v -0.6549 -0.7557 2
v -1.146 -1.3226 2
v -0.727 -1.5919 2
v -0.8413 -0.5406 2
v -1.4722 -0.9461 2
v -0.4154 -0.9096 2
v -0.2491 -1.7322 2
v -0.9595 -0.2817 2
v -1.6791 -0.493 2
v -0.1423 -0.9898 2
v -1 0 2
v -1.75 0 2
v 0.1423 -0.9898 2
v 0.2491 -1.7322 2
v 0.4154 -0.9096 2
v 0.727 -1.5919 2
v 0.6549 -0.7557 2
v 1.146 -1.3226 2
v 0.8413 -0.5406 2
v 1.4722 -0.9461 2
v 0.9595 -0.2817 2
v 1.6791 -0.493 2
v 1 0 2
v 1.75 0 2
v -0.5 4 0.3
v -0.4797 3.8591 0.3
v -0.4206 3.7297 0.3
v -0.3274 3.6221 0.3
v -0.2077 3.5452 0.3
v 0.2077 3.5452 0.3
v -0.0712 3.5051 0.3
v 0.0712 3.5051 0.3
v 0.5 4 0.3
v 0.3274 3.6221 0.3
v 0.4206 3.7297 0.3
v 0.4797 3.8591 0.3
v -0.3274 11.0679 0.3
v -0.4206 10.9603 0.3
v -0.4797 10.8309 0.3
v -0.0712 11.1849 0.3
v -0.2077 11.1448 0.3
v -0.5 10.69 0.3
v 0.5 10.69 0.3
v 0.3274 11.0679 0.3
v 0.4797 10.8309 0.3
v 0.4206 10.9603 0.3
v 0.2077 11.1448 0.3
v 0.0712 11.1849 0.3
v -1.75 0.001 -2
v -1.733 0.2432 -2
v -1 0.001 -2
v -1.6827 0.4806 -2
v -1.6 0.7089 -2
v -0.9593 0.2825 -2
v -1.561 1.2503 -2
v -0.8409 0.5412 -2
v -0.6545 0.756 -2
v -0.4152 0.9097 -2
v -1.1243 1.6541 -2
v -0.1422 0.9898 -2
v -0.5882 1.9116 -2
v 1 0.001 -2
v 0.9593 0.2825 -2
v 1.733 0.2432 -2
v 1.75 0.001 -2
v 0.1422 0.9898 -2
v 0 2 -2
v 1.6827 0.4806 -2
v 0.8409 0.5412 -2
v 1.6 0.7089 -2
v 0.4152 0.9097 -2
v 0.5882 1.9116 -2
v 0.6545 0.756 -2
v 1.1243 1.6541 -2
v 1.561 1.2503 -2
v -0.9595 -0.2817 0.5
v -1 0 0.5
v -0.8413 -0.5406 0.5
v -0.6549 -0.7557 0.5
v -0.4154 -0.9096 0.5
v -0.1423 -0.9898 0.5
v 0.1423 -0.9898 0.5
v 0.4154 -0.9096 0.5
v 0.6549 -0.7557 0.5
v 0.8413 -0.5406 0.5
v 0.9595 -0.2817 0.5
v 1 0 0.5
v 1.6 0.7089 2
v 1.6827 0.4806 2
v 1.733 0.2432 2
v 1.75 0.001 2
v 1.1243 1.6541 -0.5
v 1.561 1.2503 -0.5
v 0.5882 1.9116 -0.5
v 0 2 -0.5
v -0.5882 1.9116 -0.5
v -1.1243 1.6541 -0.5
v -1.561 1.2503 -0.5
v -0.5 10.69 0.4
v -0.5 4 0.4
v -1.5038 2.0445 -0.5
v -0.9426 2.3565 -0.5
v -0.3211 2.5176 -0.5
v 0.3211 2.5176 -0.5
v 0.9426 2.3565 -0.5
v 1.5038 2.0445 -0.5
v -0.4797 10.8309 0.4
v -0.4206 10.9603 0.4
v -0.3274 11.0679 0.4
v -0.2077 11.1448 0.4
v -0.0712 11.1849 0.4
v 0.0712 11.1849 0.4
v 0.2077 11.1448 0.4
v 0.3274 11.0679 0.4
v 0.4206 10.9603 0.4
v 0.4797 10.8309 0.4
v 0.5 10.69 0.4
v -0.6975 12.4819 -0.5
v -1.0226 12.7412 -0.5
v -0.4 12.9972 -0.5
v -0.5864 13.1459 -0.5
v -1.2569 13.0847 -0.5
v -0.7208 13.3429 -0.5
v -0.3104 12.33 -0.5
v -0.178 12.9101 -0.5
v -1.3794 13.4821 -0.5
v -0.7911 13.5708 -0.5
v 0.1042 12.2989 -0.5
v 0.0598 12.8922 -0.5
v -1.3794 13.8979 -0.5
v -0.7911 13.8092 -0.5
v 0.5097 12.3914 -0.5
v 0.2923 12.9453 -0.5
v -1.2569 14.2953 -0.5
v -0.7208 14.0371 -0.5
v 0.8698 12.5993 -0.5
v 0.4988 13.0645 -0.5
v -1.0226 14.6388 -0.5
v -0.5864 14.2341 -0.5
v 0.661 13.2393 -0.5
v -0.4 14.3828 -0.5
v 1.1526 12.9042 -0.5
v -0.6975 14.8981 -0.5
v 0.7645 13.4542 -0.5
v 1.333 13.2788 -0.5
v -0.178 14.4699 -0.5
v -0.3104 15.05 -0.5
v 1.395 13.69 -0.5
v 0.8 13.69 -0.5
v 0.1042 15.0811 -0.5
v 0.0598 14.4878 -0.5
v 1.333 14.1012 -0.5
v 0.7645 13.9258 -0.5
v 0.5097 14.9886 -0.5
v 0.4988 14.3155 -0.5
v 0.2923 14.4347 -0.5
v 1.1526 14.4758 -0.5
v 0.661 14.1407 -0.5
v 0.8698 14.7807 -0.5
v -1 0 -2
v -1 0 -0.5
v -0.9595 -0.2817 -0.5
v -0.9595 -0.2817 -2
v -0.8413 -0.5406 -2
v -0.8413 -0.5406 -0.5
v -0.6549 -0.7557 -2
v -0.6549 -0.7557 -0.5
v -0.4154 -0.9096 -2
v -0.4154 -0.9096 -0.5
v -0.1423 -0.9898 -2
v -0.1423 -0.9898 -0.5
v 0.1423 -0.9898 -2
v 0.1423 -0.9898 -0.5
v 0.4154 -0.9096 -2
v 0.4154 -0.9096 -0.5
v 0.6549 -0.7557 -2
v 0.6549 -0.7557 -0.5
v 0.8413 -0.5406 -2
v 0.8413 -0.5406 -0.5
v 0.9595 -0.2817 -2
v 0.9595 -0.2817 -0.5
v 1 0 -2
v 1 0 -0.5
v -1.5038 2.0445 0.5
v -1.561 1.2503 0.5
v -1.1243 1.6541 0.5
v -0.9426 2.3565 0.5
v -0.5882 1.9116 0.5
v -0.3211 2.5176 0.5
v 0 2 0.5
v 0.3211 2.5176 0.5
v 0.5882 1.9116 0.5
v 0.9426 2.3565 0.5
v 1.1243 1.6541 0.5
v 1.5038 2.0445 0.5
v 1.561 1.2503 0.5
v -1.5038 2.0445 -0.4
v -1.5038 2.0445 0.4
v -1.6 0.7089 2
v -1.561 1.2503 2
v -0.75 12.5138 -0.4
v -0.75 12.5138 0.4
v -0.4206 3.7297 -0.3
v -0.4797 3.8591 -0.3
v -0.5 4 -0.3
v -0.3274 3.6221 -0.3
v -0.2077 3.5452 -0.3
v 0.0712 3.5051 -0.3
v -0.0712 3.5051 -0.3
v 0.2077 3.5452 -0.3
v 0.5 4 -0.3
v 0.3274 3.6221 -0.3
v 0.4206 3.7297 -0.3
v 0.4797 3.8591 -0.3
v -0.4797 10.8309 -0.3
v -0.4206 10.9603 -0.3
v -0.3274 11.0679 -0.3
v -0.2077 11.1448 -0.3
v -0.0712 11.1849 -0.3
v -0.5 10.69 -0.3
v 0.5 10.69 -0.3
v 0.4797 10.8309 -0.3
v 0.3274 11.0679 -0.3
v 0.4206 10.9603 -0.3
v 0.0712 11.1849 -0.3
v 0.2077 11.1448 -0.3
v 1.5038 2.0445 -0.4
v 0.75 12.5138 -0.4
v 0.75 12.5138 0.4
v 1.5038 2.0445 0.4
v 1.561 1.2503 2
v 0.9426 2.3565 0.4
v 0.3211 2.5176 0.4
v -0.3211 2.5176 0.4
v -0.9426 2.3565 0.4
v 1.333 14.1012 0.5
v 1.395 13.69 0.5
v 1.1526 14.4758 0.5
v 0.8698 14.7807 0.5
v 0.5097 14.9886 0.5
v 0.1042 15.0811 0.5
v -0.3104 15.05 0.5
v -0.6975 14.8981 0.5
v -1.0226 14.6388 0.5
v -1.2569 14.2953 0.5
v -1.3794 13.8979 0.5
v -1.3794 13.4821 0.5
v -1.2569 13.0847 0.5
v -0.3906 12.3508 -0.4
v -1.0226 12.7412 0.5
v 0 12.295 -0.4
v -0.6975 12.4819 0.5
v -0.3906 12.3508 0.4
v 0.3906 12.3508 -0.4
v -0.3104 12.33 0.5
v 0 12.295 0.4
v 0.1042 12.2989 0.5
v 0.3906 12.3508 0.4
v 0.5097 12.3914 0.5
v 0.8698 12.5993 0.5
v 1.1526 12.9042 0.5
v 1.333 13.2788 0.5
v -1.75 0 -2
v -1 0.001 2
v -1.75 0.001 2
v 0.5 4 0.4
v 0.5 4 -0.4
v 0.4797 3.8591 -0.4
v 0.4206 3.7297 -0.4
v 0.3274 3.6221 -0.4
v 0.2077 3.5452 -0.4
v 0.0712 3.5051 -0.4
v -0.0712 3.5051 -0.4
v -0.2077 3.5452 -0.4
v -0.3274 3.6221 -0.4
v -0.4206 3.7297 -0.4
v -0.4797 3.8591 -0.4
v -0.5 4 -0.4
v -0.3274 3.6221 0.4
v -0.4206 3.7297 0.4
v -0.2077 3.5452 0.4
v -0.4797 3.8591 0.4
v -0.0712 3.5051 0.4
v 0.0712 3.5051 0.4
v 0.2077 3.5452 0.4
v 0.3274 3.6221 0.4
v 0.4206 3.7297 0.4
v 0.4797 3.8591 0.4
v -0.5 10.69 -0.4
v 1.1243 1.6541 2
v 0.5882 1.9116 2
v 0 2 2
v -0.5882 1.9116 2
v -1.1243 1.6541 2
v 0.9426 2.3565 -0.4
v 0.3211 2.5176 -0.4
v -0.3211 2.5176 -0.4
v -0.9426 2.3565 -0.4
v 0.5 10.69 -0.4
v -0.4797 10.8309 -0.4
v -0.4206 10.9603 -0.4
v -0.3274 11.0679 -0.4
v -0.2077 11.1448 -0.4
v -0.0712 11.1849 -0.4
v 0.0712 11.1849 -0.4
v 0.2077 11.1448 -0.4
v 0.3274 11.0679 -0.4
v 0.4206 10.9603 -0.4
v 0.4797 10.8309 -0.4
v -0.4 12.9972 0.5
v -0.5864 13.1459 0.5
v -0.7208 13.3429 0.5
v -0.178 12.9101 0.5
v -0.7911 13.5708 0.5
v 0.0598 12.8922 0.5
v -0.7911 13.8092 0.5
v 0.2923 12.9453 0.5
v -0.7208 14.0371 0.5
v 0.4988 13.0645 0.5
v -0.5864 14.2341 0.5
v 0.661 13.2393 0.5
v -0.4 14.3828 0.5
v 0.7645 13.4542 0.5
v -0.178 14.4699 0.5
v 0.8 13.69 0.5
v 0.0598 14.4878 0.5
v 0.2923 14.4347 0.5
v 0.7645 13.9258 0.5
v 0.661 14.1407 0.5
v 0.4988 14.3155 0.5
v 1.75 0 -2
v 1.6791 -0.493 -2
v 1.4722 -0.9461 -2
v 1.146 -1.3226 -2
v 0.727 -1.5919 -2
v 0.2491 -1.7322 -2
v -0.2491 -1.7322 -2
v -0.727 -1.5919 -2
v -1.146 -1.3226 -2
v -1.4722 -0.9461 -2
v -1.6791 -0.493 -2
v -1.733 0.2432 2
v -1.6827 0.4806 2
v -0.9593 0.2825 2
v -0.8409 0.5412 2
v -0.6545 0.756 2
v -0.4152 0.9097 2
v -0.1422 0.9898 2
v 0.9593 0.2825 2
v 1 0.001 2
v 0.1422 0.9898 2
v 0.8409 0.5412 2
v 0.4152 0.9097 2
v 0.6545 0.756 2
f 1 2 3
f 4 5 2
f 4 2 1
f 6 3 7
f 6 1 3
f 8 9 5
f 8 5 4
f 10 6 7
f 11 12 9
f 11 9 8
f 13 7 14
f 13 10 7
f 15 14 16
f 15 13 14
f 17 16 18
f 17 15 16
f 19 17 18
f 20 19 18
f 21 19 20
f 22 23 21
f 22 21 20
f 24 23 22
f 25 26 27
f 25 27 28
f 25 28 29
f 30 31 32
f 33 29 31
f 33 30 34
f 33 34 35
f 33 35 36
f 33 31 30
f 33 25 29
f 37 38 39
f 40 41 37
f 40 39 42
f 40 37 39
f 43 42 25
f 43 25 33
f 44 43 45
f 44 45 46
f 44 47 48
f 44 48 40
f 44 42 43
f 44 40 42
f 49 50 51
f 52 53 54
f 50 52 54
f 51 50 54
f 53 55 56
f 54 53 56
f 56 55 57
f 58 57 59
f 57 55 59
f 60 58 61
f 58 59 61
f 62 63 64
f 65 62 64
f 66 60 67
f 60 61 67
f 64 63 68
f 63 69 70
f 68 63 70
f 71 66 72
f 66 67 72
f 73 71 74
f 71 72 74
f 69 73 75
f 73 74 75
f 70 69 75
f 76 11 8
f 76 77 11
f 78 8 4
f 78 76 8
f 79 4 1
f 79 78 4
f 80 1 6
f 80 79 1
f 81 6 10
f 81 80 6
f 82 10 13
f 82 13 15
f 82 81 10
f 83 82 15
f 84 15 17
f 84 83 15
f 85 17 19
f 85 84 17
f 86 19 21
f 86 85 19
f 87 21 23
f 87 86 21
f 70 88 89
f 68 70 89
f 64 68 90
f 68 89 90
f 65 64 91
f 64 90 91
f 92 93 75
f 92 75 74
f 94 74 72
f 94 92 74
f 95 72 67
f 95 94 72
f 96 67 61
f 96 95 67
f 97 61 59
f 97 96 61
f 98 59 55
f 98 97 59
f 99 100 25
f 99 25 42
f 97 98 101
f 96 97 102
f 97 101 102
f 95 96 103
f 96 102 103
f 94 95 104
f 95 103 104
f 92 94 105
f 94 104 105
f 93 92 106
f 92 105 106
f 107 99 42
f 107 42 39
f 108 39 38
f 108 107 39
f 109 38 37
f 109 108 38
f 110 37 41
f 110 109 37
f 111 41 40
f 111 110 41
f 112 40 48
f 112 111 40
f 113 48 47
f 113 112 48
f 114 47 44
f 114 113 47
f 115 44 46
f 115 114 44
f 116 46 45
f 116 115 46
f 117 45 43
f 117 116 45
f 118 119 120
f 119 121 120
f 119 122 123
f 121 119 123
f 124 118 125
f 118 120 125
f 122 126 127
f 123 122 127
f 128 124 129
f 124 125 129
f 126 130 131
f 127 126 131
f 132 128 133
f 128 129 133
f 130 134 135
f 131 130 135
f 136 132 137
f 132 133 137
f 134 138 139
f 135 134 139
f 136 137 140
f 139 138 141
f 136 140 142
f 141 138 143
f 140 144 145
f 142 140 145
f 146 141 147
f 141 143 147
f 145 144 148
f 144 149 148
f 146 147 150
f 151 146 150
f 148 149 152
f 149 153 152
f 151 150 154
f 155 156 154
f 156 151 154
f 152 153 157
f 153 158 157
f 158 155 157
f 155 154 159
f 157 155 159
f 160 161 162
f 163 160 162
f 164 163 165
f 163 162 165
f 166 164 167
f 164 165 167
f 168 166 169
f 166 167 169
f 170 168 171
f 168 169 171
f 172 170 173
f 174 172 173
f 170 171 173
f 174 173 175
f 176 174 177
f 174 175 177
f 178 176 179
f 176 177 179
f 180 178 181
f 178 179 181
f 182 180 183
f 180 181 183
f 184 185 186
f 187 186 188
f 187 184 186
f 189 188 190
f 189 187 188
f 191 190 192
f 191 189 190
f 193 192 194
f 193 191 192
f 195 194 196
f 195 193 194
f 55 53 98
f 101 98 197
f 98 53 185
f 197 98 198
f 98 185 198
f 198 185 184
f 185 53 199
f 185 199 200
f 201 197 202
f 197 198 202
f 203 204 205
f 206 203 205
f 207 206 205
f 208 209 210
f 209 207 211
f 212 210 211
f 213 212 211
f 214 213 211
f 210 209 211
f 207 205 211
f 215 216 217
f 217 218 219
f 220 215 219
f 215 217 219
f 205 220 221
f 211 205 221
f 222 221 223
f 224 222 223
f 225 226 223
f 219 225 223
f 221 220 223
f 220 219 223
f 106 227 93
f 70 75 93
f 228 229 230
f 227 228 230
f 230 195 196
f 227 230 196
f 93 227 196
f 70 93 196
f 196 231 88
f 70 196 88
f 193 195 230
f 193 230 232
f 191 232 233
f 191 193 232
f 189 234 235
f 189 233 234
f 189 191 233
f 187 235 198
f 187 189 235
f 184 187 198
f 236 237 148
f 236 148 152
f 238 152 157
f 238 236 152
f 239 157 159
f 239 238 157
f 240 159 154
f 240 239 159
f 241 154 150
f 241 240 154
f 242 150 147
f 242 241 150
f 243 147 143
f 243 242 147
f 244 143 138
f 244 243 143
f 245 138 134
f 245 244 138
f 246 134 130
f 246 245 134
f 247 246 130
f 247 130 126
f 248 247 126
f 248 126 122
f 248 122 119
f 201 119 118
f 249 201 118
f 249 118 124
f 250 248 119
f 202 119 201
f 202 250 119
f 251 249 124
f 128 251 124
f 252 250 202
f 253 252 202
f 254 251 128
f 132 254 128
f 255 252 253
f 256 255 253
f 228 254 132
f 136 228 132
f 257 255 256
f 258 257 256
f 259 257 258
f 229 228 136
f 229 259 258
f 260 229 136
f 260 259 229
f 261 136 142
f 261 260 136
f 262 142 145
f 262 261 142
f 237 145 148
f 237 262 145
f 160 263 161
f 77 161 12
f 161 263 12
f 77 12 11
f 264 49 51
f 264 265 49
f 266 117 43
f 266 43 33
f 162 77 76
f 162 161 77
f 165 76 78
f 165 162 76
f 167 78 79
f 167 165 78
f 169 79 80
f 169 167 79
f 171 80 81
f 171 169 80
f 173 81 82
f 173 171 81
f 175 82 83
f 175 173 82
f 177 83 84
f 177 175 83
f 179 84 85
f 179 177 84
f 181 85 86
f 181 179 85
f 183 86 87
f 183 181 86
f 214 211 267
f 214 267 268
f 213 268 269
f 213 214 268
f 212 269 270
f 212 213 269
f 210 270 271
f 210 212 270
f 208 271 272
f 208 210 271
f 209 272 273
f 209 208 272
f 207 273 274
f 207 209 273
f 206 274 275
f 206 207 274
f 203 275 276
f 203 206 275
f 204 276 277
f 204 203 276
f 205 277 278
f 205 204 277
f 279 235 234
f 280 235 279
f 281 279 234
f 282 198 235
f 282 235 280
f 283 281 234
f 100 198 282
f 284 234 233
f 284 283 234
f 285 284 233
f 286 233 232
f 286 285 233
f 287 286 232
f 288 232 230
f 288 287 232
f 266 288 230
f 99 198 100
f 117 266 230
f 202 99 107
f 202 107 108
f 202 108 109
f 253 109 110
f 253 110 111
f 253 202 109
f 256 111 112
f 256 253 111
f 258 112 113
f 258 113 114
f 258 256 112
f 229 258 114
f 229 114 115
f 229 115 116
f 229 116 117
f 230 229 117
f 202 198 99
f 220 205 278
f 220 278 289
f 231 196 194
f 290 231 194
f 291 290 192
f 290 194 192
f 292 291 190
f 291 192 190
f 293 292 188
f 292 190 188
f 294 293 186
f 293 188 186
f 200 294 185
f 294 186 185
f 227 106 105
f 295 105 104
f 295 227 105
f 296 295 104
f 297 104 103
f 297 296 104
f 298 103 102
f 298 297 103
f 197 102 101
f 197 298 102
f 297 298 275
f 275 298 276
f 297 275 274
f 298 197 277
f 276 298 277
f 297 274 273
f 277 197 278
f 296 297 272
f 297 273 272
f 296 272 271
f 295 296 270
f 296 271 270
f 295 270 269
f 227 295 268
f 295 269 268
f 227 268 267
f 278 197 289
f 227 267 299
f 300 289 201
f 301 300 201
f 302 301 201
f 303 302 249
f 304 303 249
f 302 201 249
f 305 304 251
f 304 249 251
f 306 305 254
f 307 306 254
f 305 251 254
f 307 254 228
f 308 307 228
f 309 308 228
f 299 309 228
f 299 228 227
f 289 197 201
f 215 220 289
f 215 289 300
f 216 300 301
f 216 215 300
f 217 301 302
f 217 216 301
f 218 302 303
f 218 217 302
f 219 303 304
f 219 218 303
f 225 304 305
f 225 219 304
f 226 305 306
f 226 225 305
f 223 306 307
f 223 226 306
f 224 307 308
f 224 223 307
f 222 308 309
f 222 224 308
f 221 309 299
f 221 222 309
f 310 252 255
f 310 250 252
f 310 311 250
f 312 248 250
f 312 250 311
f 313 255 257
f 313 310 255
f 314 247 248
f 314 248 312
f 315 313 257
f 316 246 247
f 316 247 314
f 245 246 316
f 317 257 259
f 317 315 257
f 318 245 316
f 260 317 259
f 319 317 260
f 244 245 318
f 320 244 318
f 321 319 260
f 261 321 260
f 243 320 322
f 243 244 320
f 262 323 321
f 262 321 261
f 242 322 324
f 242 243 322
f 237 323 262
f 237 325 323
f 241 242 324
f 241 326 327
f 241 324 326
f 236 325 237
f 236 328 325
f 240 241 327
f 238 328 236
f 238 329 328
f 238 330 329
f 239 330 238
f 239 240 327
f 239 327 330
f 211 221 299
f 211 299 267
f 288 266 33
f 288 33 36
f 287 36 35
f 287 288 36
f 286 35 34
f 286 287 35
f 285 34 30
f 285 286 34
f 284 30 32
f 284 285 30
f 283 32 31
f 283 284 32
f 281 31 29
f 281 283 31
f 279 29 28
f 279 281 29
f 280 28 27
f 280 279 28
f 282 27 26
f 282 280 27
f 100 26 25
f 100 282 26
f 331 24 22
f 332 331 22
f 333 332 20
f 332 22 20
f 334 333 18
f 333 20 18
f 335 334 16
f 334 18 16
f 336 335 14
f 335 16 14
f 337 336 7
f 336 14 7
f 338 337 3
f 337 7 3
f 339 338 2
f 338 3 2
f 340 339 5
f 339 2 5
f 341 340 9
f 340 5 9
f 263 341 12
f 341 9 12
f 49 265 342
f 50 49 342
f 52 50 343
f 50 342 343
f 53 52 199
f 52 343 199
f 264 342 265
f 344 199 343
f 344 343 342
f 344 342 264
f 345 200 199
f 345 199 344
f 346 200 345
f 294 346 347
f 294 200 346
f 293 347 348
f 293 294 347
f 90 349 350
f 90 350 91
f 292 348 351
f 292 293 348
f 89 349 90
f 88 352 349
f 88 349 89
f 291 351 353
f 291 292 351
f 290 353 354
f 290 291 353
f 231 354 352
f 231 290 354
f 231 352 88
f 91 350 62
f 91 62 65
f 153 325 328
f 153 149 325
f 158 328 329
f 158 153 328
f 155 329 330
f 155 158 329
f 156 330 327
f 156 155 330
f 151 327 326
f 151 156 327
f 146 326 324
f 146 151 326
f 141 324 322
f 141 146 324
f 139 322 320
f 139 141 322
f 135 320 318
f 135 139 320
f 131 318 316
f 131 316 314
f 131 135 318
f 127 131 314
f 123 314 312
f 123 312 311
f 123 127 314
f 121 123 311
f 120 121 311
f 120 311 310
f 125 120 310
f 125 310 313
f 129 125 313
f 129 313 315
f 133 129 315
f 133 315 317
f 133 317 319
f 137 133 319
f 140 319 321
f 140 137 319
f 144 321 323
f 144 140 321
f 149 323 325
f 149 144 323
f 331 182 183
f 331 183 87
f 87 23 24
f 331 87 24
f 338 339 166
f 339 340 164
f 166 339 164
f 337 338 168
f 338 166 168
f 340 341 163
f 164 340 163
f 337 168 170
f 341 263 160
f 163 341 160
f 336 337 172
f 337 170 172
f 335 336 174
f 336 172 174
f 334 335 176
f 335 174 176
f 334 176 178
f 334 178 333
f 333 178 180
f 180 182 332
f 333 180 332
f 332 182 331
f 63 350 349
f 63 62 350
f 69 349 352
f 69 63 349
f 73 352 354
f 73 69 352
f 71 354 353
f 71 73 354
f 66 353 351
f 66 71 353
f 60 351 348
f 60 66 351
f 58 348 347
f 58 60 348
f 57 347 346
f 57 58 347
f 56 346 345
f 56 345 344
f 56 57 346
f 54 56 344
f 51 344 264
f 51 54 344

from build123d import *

# Parameters (mm, degrees)
SKETCH1_R                = 1.395
SKETCH1_R_2              = 0.8
BOSS_EXTRUDE1_DEPTH      = 0.5
SKETCH1_R_3              = 2.538
SKETCH1_R_4              = 1
BOSS_EXTRUDE1_2_DEPTH    = 0.5
BOSS_EXTRUDE2_DEPTH      = 0.4
BOSS_EXTRUDE3_DEPTH      = 0.3
BOSS_EXTRUDE4_DEPTH      = 1.5
BOSS_EXTRUDE4_DEPTH_BACK = 2.5
SKETCH2_R                = 2
SKETCH2_R_2              = 1
CUT_EXTRUDE1_DEPTH       = 7.1
SKETCH4_W                = 9.895137424
SKETCH4_H                = 0.001
CUT_EXTRUDE4_DEPTH       = 10.91


with BuildPart() as part:
    # Sketch1 → Boss-Extrude1 (new, symmetric)
    with BuildSketch(Plane.XY):
        with Locations((0, 13.69)):
            Circle(SKETCH1_R)
        with Locations((0, 13.69)):
            Circle(SKETCH1_R_2, mode=Mode.SUBTRACT)
    extrude(amount=BOSS_EXTRUDE1_DEPTH, both=True)



with BuildPart() as body_2:
    # Sketch1 → Boss-Extrude1 2 (new, symmetric)
    with BuildSketch(Plane.XY):
        Circle(SKETCH1_R_3)
        Circle(SKETCH1_R_4, mode=Mode.SUBTRACT)
    extrude(amount=BOSS_EXTRUDE1_2_DEPTH, both=True)


with BuildPart() as part_1:
    add(part.part)

    add(body_2.part)  # Boss-Extrude2 merges body 2
    # Sketch1<3> → Boss-Extrude2 (add, symmetric)
    with BuildSketch(Plane.XY):
        with BuildLine():
            ThreePointArc((0.75, 12.513766605), (0, 12.295), (-0.75, 12.513766605))
            Line((-0.75, 12.513766605), (-1.65, 1.928456378))
            ThreePointArc((-1.65, 1.928456378), (0, 2.538), (1.65, 1.928456378))
            Line((1.65, 1.928456378), (0.75, 12.513766605))
        make_face()
        with BuildLine():
            ThreePointArc((-0.5, 10.69), (0, 11.19), (0.5, 10.69))
            Line((0.5, 10.69), (0.5, 4))
            ThreePointArc((0.5, 4), (0, 3.5), (-0.5, 4))
            Line((-0.5, 4), (-0.5, 10.69))
        make_face(mode=Mode.SUBTRACT)
    extrude(amount=BOSS_EXTRUDE2_DEPTH, both=True)

    # Sketch1<4> → Boss-Extrude3 (add, symmetric)
    with BuildSketch(Plane.XY):
        with BuildLine():
            Line((0.5, 4), (0.5, 10.69))
            ThreePointArc((0.5, 10.69), (0, 11.19), (-0.5, 10.69))
            Line((-0.5, 10.69), (-0.5, 4))
            ThreePointArc((-0.5, 4), (0, 3.5), (0.5, 4))
        make_face()
    extrude(amount=BOSS_EXTRUDE3_DEPTH, both=True)

    # Sketch2 → Boss-Extrude4 (add, two sides: drawn at the far end of the back side and taken through both)
    with BuildSketch(Plane.XY.offset(0.5).offset(-BOSS_EXTRUDE4_DEPTH_BACK)):
        Circle(SKETCH2_R)
        Circle(SKETCH2_R_2, mode=Mode.SUBTRACT)
    extrude(amount=BOSS_EXTRUDE4_DEPTH + BOSS_EXTRUDE4_DEPTH_BACK)

    # Sketch3 → Cut-Extrude1 (cut, symmetric)
    with BuildSketch(Plane.XY):
        with BuildLine():
            Line((-0.75, 12.513766605), (-2.890594353, 1.97343971))
            ThreePointArc((-2.890594353, 1.97343971), (0, -3.5), (2.890594353, 1.97343971))
            Line((2.890594353, 1.97343971), (0.75, 12.513766605))
            Line((0.75, 12.513766605), (1.6, 0.708872344))
            ThreePointArc((1.6, 0.708872344), (0, -1.75), (-1.6, 0.708872344))
            Line((-1.6, 0.708872344), (-0.75, 12.513766605))
        make_face()
    extrude(amount=CUT_EXTRUDE1_DEPTH, both=True, mode=Mode.SUBTRACT)

    # Sketch4 → Cut-Extrude4 (cut, symmetric)
    with BuildSketch(Plane.XY):
        with Locations((0.269871194, 0.0005)):
            Rectangle(SKETCH4_W, SKETCH4_H)
    extrude(amount=CUT_EXTRUDE4_DEPTH, both=True, mode=Mode.SUBTRACT)


with BuildPart() as cut_extrude4_piece_1:
    # of the separate pieces the step leaves, piece 1, a body of its own (cut_extrude4_pieces)
    add(part_1.part.solids().sort_by_distance((1.50383015, 2.044489882, -0.5))[0])


with BuildPart() as cut_extrude4_piece_2:
    # of the separate pieces the step leaves, piece 2, a body of its own (cut_extrude4_pieces)
    add(part_1.part.solids().sort_by_distance((-1.75, 0, -2))[0])


solid = Compound([cut_extrude4_piece_1.part, cut_extrude4_piece_2.part])
